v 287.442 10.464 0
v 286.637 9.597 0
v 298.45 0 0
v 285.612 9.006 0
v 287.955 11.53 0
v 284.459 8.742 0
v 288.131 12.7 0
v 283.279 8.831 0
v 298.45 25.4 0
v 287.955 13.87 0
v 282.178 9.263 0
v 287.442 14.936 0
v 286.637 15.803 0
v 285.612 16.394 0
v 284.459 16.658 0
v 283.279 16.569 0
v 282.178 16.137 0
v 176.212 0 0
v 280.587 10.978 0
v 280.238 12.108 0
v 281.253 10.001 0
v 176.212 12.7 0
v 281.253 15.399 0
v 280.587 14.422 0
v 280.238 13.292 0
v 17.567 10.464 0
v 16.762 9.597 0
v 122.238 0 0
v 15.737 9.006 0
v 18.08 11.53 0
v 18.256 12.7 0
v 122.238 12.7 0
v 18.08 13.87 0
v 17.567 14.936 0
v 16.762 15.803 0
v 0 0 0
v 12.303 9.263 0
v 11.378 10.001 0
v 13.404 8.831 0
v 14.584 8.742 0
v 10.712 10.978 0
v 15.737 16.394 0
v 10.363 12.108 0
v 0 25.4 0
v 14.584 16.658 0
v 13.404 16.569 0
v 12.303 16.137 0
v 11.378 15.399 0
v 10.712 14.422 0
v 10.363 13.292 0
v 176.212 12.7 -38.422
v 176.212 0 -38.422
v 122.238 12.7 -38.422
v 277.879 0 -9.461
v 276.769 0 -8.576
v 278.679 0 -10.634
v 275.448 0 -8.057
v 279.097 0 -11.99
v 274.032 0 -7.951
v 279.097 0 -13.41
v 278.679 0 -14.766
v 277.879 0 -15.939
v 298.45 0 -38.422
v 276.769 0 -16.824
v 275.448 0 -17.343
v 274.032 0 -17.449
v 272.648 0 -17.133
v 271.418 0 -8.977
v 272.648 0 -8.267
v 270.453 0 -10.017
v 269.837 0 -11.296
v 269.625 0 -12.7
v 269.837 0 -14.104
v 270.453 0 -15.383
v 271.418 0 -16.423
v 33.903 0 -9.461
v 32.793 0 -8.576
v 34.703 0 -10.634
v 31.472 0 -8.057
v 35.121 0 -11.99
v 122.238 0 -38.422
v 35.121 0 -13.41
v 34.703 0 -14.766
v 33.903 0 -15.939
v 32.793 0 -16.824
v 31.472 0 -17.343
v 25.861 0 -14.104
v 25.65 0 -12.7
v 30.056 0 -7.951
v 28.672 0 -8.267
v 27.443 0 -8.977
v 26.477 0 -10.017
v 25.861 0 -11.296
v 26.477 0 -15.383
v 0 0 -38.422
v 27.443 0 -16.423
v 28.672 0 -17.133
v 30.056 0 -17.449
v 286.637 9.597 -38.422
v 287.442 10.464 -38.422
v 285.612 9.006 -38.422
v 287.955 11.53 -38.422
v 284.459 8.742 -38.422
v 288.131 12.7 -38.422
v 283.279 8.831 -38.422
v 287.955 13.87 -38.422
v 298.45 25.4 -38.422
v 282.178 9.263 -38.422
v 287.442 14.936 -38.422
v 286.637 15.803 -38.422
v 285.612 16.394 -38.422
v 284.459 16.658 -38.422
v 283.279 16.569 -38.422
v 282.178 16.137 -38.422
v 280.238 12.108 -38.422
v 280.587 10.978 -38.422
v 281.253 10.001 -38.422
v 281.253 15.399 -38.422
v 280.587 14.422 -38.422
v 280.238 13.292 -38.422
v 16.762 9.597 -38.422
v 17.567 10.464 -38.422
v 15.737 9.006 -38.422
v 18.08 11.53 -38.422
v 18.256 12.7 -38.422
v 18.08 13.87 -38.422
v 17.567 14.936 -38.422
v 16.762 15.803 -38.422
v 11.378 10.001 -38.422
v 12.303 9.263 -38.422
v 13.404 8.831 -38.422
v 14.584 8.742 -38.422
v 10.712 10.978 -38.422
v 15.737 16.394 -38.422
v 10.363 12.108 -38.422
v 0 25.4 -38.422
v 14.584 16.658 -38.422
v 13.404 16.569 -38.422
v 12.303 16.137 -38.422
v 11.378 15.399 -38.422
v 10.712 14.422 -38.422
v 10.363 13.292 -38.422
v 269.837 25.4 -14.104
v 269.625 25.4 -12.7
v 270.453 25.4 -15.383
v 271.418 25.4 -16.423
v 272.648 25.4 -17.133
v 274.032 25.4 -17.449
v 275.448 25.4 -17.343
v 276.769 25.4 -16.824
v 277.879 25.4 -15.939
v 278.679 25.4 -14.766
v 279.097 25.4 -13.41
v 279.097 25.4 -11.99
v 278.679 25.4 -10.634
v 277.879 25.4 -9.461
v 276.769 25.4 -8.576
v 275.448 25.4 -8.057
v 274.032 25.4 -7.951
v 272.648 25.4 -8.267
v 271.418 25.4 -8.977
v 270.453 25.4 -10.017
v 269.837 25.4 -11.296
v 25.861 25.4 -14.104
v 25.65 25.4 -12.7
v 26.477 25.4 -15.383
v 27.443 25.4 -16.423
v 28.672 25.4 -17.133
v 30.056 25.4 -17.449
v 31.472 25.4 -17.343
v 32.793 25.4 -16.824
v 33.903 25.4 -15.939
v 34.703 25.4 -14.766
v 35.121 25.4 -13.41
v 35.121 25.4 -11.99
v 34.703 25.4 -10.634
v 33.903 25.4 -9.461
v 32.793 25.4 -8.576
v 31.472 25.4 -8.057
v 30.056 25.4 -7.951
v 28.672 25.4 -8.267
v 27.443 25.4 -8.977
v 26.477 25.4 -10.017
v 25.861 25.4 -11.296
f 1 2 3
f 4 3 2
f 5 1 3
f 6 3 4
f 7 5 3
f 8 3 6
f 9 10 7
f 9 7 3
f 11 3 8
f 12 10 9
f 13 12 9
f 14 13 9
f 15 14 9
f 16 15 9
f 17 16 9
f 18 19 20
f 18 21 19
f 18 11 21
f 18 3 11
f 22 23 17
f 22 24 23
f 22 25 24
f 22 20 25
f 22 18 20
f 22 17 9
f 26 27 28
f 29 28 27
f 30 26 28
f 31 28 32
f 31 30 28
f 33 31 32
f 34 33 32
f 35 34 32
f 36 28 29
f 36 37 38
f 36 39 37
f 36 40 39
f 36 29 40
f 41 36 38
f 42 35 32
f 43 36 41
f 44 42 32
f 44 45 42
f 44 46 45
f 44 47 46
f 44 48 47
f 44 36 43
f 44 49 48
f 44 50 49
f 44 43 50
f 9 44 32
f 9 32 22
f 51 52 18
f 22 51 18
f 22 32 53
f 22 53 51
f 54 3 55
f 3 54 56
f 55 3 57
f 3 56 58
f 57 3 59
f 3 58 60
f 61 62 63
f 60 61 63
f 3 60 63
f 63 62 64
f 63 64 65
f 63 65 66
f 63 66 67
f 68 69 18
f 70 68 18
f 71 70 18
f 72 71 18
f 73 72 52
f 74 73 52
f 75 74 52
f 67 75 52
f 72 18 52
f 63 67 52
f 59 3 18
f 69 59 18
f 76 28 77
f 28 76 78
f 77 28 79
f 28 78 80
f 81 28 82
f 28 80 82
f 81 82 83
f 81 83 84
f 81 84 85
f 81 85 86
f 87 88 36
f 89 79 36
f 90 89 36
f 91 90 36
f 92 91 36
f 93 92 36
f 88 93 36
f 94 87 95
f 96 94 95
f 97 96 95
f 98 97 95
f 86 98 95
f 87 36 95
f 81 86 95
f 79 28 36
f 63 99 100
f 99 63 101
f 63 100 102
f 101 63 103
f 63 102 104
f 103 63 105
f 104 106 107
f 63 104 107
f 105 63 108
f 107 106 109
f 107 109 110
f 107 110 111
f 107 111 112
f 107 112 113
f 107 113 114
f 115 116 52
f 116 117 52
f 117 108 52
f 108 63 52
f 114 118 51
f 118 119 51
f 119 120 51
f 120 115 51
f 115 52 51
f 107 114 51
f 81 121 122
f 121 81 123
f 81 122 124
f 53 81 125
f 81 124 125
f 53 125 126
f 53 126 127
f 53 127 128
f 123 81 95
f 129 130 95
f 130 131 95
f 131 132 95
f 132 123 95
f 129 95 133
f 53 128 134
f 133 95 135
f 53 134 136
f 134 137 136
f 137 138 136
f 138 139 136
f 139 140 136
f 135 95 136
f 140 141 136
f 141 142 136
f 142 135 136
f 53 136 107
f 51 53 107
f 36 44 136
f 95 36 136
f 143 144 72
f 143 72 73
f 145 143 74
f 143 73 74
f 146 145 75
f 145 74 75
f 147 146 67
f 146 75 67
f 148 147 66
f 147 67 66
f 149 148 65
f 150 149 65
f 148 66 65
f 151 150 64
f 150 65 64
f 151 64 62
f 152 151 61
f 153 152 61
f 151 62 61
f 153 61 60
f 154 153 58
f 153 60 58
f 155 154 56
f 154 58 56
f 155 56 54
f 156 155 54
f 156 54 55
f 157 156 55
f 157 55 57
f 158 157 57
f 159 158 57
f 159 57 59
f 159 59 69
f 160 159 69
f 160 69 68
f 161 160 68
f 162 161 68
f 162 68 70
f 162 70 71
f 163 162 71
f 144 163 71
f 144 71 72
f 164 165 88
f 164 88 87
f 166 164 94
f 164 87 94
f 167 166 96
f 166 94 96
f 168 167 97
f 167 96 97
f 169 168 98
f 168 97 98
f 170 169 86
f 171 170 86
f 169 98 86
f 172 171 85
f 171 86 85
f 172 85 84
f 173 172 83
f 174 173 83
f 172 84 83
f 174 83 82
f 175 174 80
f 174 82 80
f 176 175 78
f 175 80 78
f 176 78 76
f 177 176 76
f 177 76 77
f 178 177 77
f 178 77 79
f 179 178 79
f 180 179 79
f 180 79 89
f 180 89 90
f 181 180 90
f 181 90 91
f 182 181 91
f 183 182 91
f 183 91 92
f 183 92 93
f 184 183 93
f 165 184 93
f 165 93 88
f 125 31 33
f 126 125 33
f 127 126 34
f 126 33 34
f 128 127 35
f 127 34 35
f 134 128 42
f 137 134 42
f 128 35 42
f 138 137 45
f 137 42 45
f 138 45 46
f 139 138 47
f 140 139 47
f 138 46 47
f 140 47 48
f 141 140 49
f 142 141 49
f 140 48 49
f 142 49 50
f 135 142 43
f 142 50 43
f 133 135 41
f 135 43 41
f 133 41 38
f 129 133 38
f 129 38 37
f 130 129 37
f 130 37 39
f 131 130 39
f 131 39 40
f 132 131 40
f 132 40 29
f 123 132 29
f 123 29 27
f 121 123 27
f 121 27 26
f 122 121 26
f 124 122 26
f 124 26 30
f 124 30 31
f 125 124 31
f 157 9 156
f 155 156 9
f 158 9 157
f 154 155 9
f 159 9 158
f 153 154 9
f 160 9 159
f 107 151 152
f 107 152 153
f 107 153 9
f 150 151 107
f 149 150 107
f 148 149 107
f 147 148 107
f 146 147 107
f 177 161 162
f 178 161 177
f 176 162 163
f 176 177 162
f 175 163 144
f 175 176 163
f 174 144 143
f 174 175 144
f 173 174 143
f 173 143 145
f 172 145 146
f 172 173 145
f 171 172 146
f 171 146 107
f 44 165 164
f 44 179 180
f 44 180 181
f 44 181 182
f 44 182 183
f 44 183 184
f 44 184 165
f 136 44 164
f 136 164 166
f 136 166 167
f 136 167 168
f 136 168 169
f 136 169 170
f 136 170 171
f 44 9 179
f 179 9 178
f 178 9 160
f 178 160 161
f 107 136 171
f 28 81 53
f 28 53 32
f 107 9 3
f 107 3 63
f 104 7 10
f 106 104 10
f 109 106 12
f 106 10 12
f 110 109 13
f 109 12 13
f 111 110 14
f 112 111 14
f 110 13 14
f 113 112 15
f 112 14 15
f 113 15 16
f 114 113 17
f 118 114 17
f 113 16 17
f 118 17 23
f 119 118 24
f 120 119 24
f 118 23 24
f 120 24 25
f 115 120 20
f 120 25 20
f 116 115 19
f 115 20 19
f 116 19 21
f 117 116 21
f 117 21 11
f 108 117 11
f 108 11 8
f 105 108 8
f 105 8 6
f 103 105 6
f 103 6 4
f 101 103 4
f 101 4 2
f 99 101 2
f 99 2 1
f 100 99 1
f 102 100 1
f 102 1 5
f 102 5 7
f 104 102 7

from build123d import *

# Parameters (mm, degrees)
SKETCH1_W                    = 38.421818
SKETCH1_H                    = 25.4
BOSS_EXTRUDE1_DEPTH          = 298.45
F_3_8_16_TAPPED_HOLE1_D      = 7.9375
F_3_8_0_375_DIAMETER_HOLE2_D = 9.525
SKETCH11_W                   = 53.975
SKETCH11_H                   = 38.421818
CUT_EXTRUDE2_DEPTH           = 12.7


with BuildPart() as part:
    # Sketch1 → Boss-Extrude1 (new body)
    with BuildSketch(Plane(origin=(0, 0, 0), x_dir=(0, 0, -1), z_dir=(1, 0, 0))):
        with Locations((19.210909, 12.7)):
            Rectangle(SKETCH1_W, SKETCH1_H)
    extrude(amount=BOSS_EXTRUDE1_DEPTH)

    # 3/8-16 Tapped Hole1 (through all)
    with Locations(Plane(origin=(0, 0, -38.421818), x_dir=(-1, 0, 0), z_dir=(0, 0, -1))):
        with Locations((-284.1625, 12.7), (-14.2875, 12.7)):
            Hole(F_3_8_16_TAPPED_HOLE1_D / 2)

    # 3/8 (0.375) Diameter Hole2 (through all)
    with Locations(Plane(origin=(0, 25.4, 0), x_dir=(1, 0, 0), z_dir=(0, 1, 0))):
        with Locations((30.4121566, 12.7), (274.3878434, 12.7)):
            Hole(F_3_8_0_375_DIAMETER_HOLE2_D / 2)

    # Sketch11 → Cut-Extrude2 (cut)
    with BuildSketch(Plane.XZ):
        with Locations((149.225, -19.210909)):
            Rectangle(SKETCH11_W, SKETCH11_H)
    extrude(amount=-CUT_EXTRUDE2_DEPTH, mode=Mode.SUBTRACT)


solid = part.part
